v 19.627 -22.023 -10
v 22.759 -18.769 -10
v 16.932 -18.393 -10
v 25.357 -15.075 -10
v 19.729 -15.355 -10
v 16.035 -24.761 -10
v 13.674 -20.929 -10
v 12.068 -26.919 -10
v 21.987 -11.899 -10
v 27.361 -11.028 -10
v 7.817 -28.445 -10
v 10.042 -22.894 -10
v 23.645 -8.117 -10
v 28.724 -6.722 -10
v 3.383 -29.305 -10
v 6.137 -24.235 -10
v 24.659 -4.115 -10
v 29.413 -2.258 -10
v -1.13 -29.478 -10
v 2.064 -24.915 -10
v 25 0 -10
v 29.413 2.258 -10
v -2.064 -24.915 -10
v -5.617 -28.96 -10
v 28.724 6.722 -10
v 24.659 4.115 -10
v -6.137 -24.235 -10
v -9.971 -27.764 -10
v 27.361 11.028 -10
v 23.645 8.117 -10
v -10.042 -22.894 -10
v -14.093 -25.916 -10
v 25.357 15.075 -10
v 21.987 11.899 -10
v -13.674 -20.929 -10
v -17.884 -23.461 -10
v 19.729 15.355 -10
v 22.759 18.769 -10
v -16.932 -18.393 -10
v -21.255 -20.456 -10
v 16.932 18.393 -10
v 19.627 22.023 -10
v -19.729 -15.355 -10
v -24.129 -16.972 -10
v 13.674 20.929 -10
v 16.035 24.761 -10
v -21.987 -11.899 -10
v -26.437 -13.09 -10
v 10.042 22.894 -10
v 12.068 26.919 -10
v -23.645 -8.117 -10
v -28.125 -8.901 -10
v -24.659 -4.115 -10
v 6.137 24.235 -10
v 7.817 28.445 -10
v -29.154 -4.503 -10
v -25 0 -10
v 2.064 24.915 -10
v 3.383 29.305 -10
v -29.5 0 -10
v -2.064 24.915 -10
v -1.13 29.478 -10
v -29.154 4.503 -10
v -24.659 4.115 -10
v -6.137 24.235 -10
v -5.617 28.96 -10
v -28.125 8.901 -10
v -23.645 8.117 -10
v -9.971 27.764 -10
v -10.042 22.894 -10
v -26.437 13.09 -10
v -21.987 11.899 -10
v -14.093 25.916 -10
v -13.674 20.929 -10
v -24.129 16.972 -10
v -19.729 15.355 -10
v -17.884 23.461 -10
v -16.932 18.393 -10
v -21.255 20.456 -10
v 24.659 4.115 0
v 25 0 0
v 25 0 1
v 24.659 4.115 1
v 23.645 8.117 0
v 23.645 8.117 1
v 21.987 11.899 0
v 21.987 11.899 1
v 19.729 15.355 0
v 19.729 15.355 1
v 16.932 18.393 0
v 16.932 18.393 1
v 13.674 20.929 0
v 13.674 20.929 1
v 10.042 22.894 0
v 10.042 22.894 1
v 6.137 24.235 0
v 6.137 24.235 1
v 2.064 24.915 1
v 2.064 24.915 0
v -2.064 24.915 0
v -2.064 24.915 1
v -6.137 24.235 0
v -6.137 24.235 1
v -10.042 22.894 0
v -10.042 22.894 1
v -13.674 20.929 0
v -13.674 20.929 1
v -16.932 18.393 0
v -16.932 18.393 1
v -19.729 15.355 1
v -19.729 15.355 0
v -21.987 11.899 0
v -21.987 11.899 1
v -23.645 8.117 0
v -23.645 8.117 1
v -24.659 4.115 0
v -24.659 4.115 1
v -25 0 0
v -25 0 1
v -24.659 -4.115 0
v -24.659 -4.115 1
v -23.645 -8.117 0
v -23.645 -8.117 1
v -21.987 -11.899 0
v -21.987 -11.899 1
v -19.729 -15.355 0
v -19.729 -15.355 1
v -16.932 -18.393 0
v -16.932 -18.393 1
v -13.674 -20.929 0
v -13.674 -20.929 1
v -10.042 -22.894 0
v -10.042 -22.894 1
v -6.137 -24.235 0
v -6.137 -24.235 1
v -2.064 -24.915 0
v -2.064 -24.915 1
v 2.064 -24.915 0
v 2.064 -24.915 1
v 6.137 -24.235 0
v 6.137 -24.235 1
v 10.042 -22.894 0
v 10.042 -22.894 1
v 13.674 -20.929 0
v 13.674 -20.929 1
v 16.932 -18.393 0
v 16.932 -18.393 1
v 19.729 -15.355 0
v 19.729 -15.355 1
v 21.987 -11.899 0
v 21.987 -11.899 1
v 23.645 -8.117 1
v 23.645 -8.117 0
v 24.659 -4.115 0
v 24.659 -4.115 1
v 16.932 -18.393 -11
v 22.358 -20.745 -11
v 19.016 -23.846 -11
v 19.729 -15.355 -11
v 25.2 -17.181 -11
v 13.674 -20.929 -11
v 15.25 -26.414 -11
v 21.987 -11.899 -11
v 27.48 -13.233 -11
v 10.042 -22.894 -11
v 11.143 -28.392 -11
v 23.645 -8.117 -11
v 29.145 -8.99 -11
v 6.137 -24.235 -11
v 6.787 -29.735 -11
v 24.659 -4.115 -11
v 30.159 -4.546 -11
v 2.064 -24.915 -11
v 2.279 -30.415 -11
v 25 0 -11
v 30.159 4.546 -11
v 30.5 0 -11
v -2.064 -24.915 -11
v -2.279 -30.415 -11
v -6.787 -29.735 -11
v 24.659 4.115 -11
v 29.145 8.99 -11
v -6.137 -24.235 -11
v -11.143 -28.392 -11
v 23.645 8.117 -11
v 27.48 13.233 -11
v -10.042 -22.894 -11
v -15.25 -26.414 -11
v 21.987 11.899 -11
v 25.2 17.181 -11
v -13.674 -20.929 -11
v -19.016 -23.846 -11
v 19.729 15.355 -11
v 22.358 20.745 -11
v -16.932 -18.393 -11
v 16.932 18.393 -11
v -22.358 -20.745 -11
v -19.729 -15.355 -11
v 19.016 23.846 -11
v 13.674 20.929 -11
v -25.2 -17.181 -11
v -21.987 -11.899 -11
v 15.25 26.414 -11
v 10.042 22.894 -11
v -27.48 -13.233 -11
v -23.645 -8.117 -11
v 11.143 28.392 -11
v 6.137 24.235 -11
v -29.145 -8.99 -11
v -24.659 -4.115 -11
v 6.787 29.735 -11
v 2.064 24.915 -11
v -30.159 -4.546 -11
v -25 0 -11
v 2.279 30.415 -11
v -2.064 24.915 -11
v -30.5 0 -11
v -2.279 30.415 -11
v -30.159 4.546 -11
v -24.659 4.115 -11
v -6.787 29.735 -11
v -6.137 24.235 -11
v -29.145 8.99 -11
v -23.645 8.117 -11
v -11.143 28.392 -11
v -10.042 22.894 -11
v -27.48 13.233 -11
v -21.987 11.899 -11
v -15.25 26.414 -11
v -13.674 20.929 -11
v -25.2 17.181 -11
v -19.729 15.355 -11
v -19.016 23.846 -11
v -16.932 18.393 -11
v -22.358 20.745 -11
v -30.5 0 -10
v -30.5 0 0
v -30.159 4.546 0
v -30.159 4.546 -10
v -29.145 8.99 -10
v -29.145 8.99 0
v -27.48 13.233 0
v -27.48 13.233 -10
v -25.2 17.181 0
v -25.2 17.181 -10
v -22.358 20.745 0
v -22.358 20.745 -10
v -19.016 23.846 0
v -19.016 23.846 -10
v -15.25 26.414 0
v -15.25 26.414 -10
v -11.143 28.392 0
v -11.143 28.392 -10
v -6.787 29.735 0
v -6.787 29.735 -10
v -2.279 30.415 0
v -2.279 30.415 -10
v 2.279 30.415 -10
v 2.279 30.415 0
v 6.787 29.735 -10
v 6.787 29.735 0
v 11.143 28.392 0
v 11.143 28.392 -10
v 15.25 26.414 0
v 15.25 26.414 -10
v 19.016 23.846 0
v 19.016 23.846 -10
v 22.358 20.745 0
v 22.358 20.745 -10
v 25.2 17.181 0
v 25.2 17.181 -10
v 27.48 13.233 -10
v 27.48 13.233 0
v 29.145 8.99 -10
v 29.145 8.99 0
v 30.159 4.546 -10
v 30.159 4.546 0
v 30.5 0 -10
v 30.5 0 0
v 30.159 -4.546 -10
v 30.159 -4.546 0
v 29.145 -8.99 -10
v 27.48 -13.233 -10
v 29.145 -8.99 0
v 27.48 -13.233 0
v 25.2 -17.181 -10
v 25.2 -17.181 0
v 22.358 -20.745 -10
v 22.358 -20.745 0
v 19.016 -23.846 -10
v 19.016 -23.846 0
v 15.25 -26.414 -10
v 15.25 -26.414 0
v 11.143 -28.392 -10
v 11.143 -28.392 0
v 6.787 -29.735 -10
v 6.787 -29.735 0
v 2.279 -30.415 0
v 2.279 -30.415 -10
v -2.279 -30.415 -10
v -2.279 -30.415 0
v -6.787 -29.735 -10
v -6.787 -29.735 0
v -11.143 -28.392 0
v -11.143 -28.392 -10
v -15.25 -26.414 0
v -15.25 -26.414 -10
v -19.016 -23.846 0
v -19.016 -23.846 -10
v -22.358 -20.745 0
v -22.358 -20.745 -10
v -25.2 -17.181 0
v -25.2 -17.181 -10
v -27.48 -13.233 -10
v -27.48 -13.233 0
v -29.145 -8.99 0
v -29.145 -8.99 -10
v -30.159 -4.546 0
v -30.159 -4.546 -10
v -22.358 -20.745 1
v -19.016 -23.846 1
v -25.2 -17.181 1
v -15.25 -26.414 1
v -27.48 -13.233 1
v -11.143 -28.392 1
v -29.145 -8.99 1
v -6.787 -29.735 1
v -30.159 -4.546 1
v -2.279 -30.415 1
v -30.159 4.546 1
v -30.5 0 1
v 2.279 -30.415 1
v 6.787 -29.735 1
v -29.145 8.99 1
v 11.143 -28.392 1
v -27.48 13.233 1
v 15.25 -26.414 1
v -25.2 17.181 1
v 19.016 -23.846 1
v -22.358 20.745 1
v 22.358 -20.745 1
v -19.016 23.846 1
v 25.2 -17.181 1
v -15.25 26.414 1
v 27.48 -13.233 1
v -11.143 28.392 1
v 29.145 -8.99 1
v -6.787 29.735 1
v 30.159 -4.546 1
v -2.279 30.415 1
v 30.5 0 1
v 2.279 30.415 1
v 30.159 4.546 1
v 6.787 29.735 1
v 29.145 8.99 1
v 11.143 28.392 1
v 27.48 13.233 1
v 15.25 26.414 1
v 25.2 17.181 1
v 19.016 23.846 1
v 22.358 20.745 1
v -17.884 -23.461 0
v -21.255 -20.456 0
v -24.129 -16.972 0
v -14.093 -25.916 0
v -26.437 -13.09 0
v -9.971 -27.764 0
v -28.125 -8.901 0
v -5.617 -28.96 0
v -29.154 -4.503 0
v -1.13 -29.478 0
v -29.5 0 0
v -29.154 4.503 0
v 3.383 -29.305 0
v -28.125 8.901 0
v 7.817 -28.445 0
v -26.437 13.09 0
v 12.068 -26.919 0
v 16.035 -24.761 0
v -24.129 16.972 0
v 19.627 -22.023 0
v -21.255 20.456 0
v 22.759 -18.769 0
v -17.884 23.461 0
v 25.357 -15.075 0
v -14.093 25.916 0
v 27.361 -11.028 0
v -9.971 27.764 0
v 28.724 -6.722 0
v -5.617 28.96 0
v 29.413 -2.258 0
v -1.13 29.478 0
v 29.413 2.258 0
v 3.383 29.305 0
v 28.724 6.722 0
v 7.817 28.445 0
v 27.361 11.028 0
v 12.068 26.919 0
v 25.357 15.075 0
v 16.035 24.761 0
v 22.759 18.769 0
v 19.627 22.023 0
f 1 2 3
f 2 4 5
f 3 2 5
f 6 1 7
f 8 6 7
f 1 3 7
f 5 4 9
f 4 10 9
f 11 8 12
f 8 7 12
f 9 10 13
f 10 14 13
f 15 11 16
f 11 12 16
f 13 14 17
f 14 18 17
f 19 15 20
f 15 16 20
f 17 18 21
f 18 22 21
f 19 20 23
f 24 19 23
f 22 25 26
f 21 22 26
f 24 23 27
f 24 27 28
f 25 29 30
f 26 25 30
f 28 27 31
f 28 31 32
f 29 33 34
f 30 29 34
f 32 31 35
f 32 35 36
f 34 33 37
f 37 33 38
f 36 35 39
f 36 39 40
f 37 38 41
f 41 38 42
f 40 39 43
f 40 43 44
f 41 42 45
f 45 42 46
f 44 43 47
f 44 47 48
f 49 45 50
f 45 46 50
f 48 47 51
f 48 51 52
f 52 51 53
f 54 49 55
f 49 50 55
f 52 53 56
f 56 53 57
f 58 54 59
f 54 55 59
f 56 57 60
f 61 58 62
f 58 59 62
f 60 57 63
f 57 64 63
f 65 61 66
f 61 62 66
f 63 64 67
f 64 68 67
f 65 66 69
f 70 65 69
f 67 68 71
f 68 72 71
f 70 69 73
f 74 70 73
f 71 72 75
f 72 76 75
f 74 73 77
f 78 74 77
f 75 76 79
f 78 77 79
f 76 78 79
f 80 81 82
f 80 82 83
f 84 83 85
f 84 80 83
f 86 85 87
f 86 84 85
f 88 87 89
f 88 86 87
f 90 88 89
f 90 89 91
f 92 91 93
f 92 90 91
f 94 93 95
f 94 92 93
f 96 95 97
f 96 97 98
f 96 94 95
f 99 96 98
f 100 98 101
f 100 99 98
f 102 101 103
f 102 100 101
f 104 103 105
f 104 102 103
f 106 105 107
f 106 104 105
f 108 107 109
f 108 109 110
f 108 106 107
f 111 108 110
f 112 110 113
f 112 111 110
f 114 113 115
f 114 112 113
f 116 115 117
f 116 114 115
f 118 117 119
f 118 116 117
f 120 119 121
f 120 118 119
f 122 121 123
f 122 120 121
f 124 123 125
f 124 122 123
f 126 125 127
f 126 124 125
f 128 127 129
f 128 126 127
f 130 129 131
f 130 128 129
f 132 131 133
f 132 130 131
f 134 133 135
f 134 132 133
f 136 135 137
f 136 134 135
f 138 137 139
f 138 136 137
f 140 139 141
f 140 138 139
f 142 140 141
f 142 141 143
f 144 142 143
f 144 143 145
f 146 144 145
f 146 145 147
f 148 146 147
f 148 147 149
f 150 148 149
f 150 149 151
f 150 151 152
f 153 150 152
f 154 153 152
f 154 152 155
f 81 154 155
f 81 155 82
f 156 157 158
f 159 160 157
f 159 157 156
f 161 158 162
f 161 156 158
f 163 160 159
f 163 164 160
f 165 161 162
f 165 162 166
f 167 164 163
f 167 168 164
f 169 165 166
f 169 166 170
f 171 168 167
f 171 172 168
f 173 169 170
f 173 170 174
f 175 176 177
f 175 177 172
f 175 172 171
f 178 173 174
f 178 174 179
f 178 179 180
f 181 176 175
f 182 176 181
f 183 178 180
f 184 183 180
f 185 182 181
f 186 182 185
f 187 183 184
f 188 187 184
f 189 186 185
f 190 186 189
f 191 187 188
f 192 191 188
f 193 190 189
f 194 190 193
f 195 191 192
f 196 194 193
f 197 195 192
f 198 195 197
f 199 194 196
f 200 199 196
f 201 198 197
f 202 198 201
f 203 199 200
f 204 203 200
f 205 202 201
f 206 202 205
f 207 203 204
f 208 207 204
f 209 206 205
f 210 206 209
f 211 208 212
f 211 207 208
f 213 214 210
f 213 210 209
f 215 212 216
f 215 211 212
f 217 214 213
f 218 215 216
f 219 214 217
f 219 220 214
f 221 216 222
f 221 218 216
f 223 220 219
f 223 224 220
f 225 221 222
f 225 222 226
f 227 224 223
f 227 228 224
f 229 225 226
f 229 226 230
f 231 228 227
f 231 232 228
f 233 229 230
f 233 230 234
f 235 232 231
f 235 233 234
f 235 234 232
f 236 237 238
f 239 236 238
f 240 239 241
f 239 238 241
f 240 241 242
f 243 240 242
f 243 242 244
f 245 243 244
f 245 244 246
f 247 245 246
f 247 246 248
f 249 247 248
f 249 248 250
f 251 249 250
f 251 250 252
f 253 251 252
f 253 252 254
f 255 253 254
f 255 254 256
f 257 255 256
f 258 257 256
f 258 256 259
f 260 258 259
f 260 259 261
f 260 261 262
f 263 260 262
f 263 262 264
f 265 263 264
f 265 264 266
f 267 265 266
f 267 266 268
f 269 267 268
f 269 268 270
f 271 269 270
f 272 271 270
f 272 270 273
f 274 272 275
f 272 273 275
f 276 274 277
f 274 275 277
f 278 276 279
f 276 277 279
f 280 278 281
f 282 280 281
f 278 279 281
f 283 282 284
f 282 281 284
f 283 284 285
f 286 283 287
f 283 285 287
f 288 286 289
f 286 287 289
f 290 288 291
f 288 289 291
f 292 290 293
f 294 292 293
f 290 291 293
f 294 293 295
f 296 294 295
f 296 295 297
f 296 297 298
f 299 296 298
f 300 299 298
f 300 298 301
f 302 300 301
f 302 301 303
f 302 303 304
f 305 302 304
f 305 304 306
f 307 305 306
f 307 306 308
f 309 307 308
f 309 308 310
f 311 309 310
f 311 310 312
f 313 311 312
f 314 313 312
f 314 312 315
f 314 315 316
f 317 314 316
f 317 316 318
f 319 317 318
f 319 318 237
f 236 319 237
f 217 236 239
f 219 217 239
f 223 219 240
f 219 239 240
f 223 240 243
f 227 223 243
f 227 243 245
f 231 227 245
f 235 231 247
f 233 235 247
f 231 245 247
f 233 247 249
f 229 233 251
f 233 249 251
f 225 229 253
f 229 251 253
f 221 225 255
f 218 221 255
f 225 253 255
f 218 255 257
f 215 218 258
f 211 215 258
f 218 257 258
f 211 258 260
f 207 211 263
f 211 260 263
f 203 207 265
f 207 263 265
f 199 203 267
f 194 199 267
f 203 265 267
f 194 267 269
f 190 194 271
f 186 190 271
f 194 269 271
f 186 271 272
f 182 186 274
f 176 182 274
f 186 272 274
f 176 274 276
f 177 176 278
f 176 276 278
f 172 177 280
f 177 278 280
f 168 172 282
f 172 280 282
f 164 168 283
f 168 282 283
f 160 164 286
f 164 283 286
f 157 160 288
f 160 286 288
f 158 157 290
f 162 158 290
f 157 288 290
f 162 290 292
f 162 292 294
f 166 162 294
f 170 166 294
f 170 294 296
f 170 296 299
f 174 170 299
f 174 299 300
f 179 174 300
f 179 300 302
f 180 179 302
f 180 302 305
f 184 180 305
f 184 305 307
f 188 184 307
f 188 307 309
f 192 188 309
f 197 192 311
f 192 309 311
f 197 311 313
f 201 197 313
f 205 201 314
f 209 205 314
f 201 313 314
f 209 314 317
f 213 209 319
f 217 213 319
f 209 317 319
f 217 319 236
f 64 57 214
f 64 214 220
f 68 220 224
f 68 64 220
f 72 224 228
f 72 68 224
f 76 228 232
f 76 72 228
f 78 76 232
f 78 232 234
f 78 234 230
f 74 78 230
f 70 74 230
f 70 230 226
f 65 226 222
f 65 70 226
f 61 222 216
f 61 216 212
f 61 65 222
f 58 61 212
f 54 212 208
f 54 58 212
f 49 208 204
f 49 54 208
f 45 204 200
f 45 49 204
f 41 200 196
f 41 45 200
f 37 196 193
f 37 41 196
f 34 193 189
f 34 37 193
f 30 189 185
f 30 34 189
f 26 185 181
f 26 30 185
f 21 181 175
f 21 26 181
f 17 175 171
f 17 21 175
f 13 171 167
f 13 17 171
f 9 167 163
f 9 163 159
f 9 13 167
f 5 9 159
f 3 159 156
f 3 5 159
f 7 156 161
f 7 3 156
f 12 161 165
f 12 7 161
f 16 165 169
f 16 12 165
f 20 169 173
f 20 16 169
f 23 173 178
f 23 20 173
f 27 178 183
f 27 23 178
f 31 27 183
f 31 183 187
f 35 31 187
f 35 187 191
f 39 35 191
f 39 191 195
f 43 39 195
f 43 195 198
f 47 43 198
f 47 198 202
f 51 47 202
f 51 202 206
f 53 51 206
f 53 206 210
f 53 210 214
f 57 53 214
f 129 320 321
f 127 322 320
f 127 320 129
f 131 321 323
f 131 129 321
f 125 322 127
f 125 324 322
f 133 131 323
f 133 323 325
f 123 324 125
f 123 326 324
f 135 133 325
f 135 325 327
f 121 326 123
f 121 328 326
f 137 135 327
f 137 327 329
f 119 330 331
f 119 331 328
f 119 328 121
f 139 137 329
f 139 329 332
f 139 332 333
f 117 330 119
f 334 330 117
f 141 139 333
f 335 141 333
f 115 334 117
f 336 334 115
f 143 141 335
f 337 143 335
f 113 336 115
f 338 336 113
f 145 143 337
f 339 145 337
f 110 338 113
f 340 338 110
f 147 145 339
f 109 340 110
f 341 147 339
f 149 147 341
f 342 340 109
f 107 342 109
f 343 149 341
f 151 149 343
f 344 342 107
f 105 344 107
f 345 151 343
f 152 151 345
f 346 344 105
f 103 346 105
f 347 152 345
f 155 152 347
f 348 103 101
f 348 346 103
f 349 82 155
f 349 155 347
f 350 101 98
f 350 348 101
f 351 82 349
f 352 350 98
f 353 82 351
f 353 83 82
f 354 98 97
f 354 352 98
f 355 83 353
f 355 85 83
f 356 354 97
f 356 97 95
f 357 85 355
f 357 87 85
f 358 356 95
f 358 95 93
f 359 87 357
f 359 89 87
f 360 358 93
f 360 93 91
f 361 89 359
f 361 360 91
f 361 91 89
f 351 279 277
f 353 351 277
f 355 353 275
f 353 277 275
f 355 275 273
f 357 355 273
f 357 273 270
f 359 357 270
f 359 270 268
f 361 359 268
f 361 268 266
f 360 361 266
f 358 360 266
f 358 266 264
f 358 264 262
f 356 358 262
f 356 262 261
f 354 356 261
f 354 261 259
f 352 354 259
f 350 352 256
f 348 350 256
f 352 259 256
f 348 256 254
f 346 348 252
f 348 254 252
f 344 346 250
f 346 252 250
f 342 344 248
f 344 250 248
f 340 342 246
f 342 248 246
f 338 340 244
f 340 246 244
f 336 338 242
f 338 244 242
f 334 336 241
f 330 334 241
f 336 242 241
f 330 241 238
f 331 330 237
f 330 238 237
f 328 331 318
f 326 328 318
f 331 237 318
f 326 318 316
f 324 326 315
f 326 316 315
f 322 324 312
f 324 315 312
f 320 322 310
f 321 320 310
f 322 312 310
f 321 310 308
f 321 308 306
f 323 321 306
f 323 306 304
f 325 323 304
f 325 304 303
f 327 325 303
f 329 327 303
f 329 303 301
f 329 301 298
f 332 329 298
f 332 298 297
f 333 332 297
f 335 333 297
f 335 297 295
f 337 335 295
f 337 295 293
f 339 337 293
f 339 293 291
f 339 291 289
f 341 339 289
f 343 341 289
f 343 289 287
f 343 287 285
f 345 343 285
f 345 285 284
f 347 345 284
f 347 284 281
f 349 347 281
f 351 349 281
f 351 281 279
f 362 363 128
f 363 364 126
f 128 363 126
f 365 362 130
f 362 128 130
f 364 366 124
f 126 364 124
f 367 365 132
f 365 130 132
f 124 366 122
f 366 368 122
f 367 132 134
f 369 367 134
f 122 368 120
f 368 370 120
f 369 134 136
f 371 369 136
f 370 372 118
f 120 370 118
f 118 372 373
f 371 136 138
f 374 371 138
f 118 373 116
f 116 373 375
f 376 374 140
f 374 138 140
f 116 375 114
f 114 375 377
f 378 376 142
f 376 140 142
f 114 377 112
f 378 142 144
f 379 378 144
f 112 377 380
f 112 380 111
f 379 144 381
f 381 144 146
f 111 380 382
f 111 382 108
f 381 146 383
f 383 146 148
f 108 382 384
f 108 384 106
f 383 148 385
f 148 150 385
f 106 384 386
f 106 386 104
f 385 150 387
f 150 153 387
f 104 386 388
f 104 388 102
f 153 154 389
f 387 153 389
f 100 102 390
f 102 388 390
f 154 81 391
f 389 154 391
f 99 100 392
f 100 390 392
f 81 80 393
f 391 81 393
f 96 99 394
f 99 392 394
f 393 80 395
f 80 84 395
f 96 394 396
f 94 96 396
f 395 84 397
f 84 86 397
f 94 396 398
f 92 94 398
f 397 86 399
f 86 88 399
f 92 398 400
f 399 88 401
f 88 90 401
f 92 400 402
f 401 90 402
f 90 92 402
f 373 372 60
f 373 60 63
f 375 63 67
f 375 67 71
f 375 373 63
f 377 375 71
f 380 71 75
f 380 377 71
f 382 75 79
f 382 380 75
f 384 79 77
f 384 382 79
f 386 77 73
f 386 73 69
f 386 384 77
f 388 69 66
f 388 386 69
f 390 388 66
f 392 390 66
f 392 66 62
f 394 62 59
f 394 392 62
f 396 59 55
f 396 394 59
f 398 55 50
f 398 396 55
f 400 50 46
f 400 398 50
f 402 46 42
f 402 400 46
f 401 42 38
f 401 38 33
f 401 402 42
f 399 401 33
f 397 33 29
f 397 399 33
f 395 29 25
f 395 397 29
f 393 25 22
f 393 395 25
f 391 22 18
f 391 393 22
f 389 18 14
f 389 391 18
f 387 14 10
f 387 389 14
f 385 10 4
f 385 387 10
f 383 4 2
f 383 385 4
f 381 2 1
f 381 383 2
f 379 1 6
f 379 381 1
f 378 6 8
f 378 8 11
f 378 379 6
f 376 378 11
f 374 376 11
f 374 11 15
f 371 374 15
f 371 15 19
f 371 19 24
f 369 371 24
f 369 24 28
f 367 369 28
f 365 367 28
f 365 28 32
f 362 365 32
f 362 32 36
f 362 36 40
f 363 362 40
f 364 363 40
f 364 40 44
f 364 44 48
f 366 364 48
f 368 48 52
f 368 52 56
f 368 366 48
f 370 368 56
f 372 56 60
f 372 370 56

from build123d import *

# Parameters (mm, degrees)
SKETCH1_R           = 30.5
SKETCH1_R_2         = 25
BOSS_EXTRUDE1_DEPTH = 1
SKETCH2_R           = 30.5
SKETCH2_R_2         = 29.5
BOSS_EXTRUDE2_DEPTH = 10
SKETCH3_R           = 30.5
SKETCH3_R_2         = 25
BOSS_EXTRUDE3_DEPTH = 1


with BuildPart() as part:
    # Sketch1 → Boss-Extrude1 (new body)
    with BuildSketch(Plane.XY):
        Circle(SKETCH1_R)
        Circle(SKETCH1_R_2, mode=Mode.SUBTRACT)
    extrude(amount=BOSS_EXTRUDE1_DEPTH)

    # Sketch2 → Boss-Extrude2 (add)
    with BuildSketch(Plane(origin=(0, 0, 0), x_dir=(-1, 0, 0), z_dir=(0, 0, -1))):
        Circle(SKETCH2_R)
        Circle(SKETCH2_R_2, mode=Mode.SUBTRACT)
    extrude(amount=BOSS_EXTRUDE2_DEPTH)

    # Sketch3 → Boss-Extrude3 (add)
    with BuildSketch(Plane(origin=(0, 0, -10), x_dir=(-1, 0, 0), z_dir=(0, 0, -1))):
        Circle(SKETCH3_R)
        Circle(SKETCH3_R_2, mode=Mode.SUBTRACT)
    extrude(amount=BOSS_EXTRUDE3_DEPTH)


solid = part.part
